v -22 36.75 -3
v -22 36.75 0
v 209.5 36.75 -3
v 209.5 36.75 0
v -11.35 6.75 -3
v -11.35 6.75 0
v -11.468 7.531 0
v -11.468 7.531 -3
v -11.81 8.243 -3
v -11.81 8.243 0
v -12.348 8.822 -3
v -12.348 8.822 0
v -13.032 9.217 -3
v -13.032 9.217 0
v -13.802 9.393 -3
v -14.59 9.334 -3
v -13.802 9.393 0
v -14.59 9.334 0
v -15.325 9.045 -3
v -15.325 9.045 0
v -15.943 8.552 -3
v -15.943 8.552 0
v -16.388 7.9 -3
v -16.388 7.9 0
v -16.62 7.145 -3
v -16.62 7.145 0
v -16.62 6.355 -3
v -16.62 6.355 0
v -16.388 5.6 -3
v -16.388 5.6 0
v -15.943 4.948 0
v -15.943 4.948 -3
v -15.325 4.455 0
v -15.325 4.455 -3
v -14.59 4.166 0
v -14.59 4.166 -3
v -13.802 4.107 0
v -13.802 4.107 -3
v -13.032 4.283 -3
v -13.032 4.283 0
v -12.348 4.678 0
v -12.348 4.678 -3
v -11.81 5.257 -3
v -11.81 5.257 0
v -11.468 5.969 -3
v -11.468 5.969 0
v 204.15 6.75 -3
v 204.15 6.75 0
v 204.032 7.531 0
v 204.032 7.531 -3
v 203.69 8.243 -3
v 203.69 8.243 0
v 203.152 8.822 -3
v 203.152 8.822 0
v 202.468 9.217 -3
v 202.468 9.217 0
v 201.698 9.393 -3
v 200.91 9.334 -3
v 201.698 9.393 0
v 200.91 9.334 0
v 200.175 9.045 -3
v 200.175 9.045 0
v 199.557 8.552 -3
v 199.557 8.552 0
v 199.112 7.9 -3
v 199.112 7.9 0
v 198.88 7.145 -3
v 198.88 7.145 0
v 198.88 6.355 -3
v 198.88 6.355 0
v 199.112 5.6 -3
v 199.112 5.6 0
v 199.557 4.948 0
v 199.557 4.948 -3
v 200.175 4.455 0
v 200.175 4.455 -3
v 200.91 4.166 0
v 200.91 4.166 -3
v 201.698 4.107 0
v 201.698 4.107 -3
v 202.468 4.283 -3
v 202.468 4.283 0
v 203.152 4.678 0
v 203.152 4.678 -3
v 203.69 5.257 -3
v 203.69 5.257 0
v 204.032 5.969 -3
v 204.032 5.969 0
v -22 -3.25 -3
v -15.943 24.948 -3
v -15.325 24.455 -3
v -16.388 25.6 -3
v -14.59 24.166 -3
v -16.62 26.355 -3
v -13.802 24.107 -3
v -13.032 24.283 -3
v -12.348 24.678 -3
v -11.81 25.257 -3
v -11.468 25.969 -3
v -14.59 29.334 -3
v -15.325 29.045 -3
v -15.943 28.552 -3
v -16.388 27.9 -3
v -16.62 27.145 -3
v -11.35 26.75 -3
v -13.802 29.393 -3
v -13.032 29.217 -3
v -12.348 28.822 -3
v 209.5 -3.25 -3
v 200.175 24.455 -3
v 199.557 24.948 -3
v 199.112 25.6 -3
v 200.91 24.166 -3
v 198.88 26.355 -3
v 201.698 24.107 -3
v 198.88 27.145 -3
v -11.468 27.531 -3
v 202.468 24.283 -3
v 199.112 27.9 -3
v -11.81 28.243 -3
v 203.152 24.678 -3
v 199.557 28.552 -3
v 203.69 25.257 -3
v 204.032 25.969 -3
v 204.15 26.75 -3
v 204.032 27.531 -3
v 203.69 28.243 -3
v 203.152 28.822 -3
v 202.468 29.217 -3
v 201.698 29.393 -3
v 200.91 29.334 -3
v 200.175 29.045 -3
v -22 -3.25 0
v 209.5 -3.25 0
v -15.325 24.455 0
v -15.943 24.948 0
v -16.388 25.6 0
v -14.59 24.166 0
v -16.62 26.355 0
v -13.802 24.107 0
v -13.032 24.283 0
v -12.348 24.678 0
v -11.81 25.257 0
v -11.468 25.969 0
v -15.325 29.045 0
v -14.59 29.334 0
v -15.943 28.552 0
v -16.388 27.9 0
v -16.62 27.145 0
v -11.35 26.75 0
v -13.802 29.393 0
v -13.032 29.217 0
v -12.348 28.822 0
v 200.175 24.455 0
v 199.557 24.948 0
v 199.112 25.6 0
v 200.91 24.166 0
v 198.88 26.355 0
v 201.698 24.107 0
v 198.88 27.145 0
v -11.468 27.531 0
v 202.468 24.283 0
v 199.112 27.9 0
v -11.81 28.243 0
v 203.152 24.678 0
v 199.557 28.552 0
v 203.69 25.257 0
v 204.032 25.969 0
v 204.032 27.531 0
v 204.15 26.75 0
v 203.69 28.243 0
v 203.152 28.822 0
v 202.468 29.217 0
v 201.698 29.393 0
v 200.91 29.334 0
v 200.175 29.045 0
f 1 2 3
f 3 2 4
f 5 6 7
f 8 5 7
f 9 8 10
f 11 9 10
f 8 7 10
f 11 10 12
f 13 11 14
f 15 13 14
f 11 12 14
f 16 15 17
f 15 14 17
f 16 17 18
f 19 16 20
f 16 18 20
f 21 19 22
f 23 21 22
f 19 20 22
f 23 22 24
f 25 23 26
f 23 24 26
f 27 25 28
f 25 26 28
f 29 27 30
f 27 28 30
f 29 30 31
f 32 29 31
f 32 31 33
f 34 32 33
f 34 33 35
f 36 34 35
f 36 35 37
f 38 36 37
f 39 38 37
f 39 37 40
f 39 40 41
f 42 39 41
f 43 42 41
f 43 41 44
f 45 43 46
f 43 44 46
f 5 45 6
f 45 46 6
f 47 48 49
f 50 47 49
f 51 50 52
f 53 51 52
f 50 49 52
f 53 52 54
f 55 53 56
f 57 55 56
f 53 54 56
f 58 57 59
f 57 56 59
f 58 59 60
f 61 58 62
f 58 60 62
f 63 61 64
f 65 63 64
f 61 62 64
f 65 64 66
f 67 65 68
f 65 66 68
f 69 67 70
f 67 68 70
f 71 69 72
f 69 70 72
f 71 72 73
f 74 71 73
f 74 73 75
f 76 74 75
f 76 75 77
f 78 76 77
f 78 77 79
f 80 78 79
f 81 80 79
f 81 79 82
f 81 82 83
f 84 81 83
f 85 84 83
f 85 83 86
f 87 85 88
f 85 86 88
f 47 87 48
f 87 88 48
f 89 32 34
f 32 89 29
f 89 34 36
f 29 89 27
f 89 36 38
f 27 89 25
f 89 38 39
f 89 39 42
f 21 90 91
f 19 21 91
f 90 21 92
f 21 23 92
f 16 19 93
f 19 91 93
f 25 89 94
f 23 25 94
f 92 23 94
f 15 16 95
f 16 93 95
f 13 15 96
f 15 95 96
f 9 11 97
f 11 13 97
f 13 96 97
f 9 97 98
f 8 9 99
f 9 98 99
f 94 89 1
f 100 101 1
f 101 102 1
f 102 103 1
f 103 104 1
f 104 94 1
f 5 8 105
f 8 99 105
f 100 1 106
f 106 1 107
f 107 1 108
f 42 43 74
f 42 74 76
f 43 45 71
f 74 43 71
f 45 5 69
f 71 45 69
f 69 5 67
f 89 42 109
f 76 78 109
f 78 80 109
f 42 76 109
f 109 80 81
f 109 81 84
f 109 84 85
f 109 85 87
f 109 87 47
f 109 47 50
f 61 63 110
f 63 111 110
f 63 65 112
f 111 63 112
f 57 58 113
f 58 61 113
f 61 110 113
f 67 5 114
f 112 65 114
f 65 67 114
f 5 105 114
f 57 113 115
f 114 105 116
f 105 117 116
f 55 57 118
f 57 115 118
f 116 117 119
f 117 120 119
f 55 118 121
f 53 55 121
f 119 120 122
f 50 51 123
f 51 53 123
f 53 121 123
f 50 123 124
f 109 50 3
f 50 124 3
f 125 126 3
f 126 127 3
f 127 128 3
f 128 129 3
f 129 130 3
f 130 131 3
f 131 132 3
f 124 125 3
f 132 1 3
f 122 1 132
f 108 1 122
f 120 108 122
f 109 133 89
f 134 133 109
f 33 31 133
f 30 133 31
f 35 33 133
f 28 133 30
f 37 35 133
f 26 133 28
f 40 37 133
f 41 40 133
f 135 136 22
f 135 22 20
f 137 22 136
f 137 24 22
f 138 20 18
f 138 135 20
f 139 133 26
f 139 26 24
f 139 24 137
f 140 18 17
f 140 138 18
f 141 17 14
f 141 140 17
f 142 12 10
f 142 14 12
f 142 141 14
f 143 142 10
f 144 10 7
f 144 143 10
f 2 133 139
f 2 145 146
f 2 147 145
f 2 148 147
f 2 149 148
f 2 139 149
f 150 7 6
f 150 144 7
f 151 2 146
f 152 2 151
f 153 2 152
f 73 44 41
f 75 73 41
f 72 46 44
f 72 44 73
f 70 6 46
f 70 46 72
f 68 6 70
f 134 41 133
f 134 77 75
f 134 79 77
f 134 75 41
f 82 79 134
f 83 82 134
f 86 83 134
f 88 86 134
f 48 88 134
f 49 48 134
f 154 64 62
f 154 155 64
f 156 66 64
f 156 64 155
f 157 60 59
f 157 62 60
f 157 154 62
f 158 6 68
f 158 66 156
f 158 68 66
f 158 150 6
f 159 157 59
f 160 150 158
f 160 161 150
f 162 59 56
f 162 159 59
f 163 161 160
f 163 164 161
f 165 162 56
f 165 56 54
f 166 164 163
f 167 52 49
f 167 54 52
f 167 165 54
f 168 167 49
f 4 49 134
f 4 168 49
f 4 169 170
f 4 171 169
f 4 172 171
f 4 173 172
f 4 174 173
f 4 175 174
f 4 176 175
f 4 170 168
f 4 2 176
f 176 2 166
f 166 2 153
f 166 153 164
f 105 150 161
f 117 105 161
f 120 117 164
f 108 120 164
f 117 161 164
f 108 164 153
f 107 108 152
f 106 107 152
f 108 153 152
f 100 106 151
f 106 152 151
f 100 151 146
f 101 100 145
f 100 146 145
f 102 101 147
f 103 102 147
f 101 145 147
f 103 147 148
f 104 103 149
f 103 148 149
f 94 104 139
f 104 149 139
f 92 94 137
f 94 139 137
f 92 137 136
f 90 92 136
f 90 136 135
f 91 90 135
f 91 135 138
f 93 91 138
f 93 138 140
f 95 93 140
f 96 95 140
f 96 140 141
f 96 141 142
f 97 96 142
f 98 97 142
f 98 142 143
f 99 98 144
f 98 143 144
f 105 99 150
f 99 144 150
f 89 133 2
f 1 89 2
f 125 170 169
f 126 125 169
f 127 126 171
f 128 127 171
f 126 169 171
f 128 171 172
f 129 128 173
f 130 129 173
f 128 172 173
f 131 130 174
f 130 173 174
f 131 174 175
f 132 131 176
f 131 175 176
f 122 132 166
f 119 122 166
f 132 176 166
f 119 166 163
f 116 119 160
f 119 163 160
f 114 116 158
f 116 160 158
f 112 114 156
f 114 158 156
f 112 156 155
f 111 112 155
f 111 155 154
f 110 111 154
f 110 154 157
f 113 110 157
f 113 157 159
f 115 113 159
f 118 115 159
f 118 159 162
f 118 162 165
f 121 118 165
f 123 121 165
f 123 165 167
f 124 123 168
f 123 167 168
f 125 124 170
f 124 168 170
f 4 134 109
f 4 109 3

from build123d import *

# Parameters (mm, degrees)
EXTRUSION_BASE_SKETCH_W      = 231.5
EXTRUSION_BASE_SKETCH_H      = 40
EXTRUSION_BASE_SKETCH_R      = 2.65
EXTRUSION_BASE_EXTRUDE_DEPTH = 3


with BuildPart() as part:
    # Extrusion Base Sketch → Extrusion Base Extrude (new body)
    with BuildSketch(Plane.XY):
        with Locations((93.75, 16.75)):
            Rectangle(EXTRUSION_BASE_SKETCH_W, EXTRUSION_BASE_SKETCH_H)
        with Locations((-14, 26.75)):
            Circle(EXTRUSION_BASE_SKETCH_R, mode=Mode.SUBTRACT)
        with Locations((-14, 6.75)):
            Circle(EXTRUSION_BASE_SKETCH_R, mode=Mode.SUBTRACT)
        with Locations((201.5, 26.75)):
            Circle(EXTRUSION_BASE_SKETCH_R, mode=Mode.SUBTRACT)
        with Locations((201.5, 6.75)):
            Circle(EXTRUSION_BASE_SKETCH_R, mode=Mode.SUBTRACT)
    extrude(amount=-EXTRUSION_BASE_EXTRUDE_DEPTH)


solid = part.part
